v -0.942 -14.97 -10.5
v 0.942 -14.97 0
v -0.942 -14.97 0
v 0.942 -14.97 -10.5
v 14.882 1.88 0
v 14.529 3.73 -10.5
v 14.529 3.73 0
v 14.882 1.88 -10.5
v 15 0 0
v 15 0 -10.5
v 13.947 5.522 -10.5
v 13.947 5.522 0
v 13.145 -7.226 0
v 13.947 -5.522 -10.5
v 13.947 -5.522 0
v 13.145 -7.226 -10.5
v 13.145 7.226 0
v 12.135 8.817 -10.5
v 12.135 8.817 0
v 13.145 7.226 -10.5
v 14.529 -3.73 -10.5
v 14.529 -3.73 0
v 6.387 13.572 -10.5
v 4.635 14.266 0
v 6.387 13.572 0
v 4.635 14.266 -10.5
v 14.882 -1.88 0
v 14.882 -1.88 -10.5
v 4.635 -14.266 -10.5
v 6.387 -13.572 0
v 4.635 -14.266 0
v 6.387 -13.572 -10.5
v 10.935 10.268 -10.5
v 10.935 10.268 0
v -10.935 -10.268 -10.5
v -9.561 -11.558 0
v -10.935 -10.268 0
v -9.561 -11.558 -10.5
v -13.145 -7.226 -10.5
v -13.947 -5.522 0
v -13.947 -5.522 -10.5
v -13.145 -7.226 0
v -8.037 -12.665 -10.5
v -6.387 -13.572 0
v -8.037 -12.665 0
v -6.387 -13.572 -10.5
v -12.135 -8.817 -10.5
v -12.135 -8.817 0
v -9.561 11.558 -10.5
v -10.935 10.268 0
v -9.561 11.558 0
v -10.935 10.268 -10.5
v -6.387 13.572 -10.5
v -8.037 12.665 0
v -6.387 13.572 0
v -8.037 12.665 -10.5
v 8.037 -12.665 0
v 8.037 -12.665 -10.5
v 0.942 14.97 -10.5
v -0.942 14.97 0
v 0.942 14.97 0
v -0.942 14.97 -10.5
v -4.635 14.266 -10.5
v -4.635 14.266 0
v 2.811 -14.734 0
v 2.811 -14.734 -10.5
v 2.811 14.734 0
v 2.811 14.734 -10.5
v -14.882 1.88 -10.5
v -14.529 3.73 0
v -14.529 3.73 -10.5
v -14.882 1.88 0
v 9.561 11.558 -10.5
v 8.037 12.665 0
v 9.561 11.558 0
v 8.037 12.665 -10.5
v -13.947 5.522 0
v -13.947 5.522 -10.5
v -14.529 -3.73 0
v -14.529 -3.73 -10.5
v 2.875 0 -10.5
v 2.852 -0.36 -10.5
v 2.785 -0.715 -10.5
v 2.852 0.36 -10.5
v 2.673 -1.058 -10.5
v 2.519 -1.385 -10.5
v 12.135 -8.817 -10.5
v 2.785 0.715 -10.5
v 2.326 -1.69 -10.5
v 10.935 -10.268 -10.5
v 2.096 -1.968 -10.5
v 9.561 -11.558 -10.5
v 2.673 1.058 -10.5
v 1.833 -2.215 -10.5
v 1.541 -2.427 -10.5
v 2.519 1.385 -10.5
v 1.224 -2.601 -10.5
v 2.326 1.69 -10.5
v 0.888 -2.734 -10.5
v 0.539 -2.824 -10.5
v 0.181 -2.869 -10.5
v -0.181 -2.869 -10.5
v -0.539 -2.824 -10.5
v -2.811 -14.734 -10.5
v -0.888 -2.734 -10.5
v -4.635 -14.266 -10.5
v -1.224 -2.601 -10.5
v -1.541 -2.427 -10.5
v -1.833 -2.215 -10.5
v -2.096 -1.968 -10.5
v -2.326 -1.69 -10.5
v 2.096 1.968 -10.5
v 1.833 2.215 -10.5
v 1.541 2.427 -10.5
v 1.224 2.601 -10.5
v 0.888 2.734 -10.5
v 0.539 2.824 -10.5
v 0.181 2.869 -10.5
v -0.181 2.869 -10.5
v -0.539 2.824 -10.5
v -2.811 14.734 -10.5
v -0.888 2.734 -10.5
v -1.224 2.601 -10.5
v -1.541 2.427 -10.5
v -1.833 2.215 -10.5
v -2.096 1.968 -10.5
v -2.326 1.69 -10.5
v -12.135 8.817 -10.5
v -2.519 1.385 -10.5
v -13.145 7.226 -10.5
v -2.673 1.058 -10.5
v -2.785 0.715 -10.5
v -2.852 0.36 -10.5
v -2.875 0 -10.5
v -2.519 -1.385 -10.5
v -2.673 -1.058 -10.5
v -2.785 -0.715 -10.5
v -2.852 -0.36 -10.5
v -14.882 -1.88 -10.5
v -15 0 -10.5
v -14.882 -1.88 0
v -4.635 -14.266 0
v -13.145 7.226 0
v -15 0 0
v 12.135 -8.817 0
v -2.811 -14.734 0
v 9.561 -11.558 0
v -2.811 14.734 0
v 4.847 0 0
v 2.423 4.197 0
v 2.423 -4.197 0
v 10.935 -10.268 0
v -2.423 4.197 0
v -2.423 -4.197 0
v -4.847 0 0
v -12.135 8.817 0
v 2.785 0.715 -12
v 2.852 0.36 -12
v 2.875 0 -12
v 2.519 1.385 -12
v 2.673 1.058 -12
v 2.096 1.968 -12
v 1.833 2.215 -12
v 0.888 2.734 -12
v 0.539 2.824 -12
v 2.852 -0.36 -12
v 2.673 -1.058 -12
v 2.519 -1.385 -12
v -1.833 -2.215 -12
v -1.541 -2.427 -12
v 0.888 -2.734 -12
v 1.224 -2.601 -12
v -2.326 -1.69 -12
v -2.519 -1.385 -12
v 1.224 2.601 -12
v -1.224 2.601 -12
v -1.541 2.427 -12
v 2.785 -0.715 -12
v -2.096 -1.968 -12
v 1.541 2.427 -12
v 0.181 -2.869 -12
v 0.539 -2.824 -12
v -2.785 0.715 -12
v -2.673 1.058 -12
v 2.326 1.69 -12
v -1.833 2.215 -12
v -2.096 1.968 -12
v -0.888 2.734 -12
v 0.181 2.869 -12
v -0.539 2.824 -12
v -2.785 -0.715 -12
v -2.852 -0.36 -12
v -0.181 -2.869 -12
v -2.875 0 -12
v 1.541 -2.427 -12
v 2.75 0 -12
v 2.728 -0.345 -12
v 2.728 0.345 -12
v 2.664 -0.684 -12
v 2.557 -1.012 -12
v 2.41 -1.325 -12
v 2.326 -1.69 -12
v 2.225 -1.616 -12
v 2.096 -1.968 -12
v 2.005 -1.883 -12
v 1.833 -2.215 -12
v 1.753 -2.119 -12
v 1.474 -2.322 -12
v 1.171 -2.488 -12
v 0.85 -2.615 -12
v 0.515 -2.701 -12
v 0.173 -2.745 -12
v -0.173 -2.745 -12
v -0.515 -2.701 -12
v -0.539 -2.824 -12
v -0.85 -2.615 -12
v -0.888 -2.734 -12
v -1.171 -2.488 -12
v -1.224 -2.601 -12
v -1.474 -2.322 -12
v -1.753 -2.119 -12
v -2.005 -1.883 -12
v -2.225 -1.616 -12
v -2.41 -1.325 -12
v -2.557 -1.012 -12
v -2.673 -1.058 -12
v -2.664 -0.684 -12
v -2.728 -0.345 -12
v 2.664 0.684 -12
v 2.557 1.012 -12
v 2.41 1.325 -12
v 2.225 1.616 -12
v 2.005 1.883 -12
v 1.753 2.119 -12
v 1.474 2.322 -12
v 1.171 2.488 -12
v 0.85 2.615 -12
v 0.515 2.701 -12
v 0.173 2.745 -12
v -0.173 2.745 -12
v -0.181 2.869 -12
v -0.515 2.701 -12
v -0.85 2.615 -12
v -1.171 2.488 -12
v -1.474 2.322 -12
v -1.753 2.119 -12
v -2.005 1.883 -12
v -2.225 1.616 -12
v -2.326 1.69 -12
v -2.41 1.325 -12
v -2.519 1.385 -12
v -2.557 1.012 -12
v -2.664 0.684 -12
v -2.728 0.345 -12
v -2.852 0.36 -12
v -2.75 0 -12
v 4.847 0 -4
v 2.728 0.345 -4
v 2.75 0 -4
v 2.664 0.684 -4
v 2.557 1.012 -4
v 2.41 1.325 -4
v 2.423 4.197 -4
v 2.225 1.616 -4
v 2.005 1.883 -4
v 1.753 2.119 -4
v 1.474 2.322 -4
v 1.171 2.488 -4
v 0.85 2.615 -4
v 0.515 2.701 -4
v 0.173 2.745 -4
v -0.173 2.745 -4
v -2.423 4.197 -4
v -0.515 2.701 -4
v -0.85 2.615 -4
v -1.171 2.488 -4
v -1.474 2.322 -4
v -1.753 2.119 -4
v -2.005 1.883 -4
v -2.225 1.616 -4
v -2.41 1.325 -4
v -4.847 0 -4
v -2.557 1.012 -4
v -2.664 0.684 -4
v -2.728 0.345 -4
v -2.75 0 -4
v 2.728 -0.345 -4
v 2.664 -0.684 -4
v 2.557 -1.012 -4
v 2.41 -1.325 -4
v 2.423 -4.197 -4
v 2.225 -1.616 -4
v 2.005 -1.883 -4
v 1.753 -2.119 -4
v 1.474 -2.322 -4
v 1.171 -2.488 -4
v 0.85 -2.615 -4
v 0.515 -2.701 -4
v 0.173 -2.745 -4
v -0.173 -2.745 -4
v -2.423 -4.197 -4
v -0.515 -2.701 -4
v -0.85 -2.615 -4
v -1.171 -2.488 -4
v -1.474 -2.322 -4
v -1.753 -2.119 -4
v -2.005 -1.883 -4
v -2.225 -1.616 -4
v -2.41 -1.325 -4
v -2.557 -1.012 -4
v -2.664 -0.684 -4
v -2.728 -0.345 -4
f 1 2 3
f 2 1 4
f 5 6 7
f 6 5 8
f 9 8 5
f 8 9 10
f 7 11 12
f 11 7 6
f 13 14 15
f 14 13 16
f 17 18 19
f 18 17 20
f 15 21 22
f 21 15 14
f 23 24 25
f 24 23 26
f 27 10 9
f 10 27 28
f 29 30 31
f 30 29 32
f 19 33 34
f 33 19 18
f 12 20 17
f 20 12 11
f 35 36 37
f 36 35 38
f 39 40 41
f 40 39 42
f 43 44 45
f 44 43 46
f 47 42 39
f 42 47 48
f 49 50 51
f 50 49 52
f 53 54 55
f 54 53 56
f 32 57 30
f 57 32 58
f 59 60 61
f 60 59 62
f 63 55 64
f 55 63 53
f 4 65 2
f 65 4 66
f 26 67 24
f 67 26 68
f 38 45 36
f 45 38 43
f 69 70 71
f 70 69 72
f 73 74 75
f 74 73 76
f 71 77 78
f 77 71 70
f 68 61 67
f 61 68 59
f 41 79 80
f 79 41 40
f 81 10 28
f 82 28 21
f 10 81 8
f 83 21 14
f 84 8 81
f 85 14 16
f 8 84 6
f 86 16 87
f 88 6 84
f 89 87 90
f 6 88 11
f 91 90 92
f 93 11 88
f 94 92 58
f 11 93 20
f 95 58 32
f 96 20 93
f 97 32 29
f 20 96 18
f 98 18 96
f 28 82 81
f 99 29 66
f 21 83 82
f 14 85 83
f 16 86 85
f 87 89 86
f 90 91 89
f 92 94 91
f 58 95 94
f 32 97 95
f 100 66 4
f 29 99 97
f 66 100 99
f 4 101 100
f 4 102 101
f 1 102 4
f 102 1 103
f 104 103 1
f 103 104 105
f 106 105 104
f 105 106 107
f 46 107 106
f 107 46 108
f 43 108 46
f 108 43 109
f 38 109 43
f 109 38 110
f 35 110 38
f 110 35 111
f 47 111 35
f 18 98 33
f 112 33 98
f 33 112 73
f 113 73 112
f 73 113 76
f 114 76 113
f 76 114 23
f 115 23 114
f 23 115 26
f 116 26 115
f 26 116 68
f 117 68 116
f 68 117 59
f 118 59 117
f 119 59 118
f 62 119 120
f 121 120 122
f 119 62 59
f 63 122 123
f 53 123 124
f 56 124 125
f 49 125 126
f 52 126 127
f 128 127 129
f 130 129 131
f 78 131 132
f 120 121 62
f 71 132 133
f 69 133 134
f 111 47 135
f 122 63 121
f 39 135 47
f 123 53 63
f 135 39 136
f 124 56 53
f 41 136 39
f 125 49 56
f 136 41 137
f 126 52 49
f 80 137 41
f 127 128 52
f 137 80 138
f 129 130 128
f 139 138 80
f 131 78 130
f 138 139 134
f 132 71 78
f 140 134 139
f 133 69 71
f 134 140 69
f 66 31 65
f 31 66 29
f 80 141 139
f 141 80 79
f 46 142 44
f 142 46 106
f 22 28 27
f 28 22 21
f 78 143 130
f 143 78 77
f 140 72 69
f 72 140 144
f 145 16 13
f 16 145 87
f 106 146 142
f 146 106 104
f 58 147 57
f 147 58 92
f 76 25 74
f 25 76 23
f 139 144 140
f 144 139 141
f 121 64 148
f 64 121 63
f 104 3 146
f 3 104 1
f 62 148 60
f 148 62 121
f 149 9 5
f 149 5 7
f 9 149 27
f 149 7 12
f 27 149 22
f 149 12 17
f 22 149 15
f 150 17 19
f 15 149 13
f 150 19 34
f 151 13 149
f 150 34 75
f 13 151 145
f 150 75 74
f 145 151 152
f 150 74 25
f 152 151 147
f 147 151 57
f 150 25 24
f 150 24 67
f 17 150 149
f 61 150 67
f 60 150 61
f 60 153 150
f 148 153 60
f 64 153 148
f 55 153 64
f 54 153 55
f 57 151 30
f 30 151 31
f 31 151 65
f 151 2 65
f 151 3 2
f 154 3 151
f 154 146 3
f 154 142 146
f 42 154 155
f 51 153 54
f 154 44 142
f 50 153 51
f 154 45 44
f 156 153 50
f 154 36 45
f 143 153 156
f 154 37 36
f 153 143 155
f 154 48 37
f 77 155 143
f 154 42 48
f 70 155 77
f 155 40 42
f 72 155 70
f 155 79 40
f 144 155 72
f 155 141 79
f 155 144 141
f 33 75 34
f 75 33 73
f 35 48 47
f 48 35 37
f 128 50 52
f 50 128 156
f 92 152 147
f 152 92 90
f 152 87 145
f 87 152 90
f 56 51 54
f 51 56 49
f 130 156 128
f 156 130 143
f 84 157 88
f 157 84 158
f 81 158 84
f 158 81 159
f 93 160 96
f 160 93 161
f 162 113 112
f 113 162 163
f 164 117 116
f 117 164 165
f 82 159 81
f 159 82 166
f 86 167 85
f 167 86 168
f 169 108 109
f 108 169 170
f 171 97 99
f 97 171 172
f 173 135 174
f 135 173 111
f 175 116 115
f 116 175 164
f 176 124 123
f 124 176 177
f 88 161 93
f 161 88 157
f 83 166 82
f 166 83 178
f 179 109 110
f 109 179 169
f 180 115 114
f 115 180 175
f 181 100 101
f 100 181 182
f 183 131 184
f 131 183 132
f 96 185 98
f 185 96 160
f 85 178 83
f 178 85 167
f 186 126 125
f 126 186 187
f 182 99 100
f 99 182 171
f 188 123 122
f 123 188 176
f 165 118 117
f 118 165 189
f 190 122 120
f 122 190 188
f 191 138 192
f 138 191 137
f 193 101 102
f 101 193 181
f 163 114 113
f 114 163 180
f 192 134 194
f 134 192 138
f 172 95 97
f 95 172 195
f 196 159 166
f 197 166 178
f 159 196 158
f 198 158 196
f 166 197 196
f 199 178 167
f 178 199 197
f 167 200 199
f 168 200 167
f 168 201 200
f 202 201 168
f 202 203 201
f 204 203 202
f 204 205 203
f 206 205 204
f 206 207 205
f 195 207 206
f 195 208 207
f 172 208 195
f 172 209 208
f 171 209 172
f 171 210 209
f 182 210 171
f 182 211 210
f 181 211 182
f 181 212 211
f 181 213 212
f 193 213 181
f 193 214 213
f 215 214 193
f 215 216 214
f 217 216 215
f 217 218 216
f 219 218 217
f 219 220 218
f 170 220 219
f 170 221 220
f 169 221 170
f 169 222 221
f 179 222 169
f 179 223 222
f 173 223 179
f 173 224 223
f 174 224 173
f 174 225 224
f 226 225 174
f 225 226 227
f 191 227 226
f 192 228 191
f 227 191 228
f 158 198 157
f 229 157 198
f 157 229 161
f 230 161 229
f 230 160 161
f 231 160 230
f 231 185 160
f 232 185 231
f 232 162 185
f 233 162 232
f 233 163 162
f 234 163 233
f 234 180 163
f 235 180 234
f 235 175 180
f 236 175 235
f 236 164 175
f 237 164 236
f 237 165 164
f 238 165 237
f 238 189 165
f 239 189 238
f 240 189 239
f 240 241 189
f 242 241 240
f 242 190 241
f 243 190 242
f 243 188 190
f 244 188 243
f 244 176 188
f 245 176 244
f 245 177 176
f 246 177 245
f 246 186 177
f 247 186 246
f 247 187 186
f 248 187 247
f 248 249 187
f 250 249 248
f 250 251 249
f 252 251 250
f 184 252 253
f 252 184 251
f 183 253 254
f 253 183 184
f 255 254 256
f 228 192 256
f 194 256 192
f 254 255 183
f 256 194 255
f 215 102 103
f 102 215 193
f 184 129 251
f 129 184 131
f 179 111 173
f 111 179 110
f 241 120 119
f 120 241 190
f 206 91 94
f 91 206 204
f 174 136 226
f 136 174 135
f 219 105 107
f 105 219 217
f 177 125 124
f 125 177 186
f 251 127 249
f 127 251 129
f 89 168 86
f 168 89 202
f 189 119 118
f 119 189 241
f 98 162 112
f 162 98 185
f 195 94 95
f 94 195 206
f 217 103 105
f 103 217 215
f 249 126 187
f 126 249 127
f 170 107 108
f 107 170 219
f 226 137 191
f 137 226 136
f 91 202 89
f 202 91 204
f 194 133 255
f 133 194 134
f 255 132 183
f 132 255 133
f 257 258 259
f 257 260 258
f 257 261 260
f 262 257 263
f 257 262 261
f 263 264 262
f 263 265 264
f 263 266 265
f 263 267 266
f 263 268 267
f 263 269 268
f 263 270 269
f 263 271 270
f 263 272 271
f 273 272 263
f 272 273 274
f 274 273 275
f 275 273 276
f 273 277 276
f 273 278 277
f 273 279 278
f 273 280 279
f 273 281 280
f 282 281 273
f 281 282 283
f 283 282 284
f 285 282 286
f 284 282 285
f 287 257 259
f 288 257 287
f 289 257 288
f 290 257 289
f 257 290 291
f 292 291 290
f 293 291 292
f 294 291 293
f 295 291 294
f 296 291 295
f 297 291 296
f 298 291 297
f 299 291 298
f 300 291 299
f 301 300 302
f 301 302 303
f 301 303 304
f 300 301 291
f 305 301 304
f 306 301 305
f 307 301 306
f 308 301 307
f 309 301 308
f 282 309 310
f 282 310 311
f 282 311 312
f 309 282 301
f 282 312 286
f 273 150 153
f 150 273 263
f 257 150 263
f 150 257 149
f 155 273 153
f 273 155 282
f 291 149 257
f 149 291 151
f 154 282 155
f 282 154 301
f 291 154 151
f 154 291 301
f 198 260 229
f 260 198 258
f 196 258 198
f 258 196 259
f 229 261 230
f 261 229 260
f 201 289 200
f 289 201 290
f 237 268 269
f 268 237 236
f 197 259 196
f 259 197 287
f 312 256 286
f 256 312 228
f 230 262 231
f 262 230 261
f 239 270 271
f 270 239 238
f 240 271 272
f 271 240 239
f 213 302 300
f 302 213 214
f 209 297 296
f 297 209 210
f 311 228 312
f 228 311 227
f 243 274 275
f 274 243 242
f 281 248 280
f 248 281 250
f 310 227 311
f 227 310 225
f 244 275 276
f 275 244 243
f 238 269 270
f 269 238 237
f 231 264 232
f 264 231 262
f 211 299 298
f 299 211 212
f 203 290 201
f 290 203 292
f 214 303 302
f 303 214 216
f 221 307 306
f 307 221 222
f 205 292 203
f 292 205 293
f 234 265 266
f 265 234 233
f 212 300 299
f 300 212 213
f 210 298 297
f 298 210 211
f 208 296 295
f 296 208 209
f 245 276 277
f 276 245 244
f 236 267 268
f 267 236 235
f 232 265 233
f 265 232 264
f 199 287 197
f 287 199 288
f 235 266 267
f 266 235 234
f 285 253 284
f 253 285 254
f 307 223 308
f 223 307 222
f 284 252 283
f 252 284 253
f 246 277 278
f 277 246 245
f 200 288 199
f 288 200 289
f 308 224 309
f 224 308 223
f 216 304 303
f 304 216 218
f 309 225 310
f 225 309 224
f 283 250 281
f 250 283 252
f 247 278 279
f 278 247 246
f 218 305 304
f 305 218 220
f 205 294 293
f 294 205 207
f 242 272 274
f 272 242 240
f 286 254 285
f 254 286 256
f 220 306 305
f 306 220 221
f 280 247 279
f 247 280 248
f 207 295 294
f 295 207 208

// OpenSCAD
$fn = 50;

difference() {
	union() {
		translate(v = [0, 0, -10.5]) {
			cylinder(h = 10.5, r = 15.0);
		}
		#translate(v = [0, 0, -12.0]) {
			cylinder(h = 12, r = 2.875);
		}
	}
	union() {
		translate(v = [0, 0, 0]) {
			rotate(a = [0, 0, 0]) {
				difference() {
					union() {
						translate(v = [0, 0, -4]) {
							linear_extrude(height = 4) {
								polygon(points = [[4.8468, 0.0], [2.4234000000000004, 4.197451927062417], [-2.423399999999999, 4.197451927062417], [-4.8468, 5.935618106107392e-16], [-2.423400000000002, -4.197451927062416], [2.423399999999997, -4.197451927062419]]);
							}
						}
					}
					union();
				}
			}
		}
		#translate(v = [0, 0, -100.0]) {
			cylinder(h = 200, r = 2.75);
		}
	}
}
